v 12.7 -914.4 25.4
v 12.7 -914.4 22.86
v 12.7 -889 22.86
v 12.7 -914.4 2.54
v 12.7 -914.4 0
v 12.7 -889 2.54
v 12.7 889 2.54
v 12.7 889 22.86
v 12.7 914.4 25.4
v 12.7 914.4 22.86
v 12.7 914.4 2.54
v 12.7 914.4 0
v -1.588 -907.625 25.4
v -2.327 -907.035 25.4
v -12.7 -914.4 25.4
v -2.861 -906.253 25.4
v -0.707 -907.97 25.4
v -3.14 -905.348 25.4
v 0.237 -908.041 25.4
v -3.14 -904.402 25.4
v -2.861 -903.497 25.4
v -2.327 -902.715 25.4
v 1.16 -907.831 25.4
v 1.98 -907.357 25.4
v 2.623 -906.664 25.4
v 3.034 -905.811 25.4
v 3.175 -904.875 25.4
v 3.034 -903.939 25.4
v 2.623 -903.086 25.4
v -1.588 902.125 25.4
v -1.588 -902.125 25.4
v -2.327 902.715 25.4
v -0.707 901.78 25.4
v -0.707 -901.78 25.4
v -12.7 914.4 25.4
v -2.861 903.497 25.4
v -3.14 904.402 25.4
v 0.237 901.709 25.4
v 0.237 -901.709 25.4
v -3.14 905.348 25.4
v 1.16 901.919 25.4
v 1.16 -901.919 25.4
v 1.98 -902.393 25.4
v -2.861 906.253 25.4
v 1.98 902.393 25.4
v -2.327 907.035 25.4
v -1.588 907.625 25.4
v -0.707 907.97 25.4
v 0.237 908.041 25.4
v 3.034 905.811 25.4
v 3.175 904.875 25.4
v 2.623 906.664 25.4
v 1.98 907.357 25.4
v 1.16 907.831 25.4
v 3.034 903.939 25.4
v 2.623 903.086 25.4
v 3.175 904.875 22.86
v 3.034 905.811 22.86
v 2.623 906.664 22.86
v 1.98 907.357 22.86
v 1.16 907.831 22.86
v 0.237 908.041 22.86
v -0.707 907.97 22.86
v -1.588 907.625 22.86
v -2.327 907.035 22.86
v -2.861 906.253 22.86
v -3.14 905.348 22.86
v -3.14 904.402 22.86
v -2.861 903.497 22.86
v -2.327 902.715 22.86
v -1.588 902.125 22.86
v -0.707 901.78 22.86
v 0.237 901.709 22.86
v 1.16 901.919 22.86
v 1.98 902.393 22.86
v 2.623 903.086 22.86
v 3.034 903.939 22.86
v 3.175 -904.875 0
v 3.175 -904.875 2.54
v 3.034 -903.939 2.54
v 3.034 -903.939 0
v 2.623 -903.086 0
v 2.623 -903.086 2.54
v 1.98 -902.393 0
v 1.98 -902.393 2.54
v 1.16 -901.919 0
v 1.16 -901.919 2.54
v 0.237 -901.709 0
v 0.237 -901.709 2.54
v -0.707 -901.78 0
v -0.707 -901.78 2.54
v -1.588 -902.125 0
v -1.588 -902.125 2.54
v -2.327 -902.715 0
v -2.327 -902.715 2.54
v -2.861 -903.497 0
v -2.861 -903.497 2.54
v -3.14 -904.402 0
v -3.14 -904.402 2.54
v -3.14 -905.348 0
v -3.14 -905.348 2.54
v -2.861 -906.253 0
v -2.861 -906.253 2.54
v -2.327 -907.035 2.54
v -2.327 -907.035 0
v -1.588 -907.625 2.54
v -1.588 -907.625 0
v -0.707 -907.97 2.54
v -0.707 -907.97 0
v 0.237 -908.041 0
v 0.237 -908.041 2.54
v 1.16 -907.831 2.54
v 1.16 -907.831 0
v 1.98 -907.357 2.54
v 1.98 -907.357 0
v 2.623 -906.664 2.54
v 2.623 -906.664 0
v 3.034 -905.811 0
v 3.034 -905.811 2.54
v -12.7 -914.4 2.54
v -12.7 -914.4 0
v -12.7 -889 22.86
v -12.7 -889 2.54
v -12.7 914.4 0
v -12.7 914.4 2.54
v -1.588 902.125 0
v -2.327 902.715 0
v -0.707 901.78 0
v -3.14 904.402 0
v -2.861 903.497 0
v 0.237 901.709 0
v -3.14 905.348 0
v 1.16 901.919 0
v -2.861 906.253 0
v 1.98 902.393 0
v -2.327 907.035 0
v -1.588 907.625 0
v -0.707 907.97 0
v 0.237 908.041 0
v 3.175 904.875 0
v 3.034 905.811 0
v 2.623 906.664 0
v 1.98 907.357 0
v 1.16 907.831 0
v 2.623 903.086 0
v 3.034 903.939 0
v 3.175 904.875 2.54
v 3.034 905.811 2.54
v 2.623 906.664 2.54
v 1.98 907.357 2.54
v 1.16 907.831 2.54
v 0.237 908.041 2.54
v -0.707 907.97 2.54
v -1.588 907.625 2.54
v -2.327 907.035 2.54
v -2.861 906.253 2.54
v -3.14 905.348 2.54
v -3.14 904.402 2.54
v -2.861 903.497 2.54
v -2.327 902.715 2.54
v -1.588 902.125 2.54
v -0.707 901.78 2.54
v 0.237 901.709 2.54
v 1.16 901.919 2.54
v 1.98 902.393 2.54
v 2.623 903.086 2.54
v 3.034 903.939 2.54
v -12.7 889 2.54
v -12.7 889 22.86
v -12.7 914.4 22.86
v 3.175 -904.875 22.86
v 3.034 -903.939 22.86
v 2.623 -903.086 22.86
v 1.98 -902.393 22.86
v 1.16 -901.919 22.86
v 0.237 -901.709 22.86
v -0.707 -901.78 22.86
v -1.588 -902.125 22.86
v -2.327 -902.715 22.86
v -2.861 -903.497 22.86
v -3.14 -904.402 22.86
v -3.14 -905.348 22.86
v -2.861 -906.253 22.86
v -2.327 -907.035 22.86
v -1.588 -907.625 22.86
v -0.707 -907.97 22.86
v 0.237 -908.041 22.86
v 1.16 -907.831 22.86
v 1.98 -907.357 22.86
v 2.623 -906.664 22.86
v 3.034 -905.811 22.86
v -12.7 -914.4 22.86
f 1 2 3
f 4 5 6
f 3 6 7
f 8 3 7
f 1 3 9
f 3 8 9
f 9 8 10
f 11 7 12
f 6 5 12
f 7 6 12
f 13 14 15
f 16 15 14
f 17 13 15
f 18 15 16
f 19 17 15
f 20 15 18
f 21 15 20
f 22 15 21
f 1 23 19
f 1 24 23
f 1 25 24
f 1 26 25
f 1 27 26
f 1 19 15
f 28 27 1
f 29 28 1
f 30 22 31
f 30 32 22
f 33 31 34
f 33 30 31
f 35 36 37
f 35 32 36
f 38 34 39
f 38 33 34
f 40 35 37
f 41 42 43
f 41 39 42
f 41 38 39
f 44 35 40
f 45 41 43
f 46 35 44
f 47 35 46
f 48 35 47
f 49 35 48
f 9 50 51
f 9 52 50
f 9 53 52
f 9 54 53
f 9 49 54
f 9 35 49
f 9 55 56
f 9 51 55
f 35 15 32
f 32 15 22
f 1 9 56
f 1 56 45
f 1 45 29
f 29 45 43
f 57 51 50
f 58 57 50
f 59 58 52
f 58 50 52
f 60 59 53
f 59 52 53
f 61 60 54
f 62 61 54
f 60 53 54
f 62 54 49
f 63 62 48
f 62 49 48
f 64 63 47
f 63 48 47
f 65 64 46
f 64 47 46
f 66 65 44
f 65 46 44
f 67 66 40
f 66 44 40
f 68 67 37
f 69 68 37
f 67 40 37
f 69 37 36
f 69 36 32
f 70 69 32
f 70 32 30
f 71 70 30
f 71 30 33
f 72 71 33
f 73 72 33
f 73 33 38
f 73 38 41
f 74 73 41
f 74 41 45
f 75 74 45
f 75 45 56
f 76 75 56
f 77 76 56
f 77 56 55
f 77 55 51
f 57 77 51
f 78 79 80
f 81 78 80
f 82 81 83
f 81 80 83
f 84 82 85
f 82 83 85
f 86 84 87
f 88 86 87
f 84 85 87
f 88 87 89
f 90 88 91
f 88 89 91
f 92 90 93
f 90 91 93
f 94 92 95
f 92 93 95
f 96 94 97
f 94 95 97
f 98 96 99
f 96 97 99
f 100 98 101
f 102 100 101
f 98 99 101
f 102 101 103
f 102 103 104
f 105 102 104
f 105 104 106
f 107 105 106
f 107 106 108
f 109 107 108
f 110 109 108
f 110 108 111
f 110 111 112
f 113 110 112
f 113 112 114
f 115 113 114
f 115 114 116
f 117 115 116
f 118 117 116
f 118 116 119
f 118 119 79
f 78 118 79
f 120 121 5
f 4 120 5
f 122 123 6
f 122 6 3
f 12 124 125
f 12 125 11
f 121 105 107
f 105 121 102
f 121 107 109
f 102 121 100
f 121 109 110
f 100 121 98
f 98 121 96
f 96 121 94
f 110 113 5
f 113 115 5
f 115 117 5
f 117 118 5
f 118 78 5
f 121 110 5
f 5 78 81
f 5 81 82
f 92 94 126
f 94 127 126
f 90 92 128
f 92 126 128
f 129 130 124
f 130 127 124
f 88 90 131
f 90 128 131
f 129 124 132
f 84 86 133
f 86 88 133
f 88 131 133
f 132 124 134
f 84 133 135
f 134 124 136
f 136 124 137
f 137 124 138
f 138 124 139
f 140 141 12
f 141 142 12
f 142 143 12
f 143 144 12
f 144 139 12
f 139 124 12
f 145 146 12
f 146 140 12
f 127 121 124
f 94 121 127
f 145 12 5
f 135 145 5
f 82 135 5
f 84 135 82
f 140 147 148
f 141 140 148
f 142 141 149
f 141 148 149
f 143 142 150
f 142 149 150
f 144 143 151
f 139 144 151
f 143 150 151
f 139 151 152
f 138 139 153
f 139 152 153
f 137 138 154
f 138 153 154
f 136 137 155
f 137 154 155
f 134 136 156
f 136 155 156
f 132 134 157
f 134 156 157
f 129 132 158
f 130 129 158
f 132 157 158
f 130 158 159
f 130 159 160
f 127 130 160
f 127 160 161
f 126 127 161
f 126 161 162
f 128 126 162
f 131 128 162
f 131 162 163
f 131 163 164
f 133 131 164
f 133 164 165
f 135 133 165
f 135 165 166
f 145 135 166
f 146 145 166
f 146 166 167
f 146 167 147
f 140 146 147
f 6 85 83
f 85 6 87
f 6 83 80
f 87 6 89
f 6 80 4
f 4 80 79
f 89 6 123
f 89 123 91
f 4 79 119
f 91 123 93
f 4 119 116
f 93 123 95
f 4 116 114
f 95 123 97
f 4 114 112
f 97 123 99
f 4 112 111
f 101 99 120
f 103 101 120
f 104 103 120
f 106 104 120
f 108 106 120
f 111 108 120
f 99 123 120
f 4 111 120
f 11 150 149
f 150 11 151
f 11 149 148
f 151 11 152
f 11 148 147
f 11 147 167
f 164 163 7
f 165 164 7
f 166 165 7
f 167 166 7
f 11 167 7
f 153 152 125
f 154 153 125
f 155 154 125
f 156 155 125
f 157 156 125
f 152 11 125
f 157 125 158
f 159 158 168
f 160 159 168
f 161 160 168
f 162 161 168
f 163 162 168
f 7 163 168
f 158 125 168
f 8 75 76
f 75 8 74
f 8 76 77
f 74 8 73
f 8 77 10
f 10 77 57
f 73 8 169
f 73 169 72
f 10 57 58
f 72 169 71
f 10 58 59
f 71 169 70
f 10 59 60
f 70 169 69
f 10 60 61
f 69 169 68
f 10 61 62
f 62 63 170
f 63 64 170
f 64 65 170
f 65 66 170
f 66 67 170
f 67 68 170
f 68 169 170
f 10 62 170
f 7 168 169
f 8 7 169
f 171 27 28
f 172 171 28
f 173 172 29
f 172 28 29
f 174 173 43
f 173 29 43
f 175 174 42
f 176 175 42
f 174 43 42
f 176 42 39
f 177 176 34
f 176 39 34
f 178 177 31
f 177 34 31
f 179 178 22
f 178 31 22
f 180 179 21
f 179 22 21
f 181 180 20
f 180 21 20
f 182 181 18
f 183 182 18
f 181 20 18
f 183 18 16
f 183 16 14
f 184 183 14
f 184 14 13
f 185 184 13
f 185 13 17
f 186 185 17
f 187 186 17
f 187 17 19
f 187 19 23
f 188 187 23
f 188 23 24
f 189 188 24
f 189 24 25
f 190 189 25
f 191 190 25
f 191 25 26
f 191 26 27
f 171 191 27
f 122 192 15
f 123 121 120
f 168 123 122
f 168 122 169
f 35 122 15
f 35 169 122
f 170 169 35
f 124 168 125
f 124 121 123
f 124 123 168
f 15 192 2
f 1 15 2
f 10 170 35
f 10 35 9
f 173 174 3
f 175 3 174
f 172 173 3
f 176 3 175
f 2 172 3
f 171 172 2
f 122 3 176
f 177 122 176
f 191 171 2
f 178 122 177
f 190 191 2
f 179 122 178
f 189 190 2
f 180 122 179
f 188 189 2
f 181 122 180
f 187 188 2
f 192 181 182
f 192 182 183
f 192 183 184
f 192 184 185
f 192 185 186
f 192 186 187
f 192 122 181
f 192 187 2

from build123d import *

# Parameters (mm, degrees)
F0_W     = 25.4
F0_H     = 1828.8
F1_DEPTH = 25.4
F2_W     = 25.4
F2_H     = 20.32
F3_DEPTH = 25.4
F4_W     = 50.8
F4_H     = 20.32
F5_DEPTH = 25.4
F6_R     = 3.175
F7_DEPTH = 50.8


with BuildPart() as f1:
    # F0 (on Top) → F1 (new body)
    with BuildSketch(Plane.XY):
        Rectangle(F0_W, F0_H)
    extrude(amount=F1_DEPTH)

    # F2 (on face) → F3 (cut)
    with BuildSketch(Plane(origin=(-12.7, 0, 0), x_dir=(0, -1, 0), z_dir=(-1, 0, 0))):
        with Locations((-927.1, 12.7)):
            Rectangle(F2_W, F2_H)
        with Locations((-901.7, 12.7)):
            Rectangle(F2_W, F2_H)
    extrude(amount=-F3_DEPTH, mode=Mode.SUBTRACT)

    # F4 (on face) → F5 (cut)
    with BuildSketch(Plane(origin=(-12.7, 0, 0), x_dir=(0, -1, 0), z_dir=(-1, 0, 0))):
        with Locations((914.4, 12.7)):
            Rectangle(F4_W, F4_H)
    extrude(amount=-F5_DEPTH, mode=Mode.SUBTRACT)

    # F6 (on face) → F7 (cut)
    with BuildSketch(Plane.XY.offset(25.4)):
        with Locations((0, 904.875)):
            Circle(F6_R)
        with Locations((0, -904.875)):
            Circle(F6_R)
    extrude(amount=-F7_DEPTH, mode=Mode.SUBTRACT)


solid = f1.part
